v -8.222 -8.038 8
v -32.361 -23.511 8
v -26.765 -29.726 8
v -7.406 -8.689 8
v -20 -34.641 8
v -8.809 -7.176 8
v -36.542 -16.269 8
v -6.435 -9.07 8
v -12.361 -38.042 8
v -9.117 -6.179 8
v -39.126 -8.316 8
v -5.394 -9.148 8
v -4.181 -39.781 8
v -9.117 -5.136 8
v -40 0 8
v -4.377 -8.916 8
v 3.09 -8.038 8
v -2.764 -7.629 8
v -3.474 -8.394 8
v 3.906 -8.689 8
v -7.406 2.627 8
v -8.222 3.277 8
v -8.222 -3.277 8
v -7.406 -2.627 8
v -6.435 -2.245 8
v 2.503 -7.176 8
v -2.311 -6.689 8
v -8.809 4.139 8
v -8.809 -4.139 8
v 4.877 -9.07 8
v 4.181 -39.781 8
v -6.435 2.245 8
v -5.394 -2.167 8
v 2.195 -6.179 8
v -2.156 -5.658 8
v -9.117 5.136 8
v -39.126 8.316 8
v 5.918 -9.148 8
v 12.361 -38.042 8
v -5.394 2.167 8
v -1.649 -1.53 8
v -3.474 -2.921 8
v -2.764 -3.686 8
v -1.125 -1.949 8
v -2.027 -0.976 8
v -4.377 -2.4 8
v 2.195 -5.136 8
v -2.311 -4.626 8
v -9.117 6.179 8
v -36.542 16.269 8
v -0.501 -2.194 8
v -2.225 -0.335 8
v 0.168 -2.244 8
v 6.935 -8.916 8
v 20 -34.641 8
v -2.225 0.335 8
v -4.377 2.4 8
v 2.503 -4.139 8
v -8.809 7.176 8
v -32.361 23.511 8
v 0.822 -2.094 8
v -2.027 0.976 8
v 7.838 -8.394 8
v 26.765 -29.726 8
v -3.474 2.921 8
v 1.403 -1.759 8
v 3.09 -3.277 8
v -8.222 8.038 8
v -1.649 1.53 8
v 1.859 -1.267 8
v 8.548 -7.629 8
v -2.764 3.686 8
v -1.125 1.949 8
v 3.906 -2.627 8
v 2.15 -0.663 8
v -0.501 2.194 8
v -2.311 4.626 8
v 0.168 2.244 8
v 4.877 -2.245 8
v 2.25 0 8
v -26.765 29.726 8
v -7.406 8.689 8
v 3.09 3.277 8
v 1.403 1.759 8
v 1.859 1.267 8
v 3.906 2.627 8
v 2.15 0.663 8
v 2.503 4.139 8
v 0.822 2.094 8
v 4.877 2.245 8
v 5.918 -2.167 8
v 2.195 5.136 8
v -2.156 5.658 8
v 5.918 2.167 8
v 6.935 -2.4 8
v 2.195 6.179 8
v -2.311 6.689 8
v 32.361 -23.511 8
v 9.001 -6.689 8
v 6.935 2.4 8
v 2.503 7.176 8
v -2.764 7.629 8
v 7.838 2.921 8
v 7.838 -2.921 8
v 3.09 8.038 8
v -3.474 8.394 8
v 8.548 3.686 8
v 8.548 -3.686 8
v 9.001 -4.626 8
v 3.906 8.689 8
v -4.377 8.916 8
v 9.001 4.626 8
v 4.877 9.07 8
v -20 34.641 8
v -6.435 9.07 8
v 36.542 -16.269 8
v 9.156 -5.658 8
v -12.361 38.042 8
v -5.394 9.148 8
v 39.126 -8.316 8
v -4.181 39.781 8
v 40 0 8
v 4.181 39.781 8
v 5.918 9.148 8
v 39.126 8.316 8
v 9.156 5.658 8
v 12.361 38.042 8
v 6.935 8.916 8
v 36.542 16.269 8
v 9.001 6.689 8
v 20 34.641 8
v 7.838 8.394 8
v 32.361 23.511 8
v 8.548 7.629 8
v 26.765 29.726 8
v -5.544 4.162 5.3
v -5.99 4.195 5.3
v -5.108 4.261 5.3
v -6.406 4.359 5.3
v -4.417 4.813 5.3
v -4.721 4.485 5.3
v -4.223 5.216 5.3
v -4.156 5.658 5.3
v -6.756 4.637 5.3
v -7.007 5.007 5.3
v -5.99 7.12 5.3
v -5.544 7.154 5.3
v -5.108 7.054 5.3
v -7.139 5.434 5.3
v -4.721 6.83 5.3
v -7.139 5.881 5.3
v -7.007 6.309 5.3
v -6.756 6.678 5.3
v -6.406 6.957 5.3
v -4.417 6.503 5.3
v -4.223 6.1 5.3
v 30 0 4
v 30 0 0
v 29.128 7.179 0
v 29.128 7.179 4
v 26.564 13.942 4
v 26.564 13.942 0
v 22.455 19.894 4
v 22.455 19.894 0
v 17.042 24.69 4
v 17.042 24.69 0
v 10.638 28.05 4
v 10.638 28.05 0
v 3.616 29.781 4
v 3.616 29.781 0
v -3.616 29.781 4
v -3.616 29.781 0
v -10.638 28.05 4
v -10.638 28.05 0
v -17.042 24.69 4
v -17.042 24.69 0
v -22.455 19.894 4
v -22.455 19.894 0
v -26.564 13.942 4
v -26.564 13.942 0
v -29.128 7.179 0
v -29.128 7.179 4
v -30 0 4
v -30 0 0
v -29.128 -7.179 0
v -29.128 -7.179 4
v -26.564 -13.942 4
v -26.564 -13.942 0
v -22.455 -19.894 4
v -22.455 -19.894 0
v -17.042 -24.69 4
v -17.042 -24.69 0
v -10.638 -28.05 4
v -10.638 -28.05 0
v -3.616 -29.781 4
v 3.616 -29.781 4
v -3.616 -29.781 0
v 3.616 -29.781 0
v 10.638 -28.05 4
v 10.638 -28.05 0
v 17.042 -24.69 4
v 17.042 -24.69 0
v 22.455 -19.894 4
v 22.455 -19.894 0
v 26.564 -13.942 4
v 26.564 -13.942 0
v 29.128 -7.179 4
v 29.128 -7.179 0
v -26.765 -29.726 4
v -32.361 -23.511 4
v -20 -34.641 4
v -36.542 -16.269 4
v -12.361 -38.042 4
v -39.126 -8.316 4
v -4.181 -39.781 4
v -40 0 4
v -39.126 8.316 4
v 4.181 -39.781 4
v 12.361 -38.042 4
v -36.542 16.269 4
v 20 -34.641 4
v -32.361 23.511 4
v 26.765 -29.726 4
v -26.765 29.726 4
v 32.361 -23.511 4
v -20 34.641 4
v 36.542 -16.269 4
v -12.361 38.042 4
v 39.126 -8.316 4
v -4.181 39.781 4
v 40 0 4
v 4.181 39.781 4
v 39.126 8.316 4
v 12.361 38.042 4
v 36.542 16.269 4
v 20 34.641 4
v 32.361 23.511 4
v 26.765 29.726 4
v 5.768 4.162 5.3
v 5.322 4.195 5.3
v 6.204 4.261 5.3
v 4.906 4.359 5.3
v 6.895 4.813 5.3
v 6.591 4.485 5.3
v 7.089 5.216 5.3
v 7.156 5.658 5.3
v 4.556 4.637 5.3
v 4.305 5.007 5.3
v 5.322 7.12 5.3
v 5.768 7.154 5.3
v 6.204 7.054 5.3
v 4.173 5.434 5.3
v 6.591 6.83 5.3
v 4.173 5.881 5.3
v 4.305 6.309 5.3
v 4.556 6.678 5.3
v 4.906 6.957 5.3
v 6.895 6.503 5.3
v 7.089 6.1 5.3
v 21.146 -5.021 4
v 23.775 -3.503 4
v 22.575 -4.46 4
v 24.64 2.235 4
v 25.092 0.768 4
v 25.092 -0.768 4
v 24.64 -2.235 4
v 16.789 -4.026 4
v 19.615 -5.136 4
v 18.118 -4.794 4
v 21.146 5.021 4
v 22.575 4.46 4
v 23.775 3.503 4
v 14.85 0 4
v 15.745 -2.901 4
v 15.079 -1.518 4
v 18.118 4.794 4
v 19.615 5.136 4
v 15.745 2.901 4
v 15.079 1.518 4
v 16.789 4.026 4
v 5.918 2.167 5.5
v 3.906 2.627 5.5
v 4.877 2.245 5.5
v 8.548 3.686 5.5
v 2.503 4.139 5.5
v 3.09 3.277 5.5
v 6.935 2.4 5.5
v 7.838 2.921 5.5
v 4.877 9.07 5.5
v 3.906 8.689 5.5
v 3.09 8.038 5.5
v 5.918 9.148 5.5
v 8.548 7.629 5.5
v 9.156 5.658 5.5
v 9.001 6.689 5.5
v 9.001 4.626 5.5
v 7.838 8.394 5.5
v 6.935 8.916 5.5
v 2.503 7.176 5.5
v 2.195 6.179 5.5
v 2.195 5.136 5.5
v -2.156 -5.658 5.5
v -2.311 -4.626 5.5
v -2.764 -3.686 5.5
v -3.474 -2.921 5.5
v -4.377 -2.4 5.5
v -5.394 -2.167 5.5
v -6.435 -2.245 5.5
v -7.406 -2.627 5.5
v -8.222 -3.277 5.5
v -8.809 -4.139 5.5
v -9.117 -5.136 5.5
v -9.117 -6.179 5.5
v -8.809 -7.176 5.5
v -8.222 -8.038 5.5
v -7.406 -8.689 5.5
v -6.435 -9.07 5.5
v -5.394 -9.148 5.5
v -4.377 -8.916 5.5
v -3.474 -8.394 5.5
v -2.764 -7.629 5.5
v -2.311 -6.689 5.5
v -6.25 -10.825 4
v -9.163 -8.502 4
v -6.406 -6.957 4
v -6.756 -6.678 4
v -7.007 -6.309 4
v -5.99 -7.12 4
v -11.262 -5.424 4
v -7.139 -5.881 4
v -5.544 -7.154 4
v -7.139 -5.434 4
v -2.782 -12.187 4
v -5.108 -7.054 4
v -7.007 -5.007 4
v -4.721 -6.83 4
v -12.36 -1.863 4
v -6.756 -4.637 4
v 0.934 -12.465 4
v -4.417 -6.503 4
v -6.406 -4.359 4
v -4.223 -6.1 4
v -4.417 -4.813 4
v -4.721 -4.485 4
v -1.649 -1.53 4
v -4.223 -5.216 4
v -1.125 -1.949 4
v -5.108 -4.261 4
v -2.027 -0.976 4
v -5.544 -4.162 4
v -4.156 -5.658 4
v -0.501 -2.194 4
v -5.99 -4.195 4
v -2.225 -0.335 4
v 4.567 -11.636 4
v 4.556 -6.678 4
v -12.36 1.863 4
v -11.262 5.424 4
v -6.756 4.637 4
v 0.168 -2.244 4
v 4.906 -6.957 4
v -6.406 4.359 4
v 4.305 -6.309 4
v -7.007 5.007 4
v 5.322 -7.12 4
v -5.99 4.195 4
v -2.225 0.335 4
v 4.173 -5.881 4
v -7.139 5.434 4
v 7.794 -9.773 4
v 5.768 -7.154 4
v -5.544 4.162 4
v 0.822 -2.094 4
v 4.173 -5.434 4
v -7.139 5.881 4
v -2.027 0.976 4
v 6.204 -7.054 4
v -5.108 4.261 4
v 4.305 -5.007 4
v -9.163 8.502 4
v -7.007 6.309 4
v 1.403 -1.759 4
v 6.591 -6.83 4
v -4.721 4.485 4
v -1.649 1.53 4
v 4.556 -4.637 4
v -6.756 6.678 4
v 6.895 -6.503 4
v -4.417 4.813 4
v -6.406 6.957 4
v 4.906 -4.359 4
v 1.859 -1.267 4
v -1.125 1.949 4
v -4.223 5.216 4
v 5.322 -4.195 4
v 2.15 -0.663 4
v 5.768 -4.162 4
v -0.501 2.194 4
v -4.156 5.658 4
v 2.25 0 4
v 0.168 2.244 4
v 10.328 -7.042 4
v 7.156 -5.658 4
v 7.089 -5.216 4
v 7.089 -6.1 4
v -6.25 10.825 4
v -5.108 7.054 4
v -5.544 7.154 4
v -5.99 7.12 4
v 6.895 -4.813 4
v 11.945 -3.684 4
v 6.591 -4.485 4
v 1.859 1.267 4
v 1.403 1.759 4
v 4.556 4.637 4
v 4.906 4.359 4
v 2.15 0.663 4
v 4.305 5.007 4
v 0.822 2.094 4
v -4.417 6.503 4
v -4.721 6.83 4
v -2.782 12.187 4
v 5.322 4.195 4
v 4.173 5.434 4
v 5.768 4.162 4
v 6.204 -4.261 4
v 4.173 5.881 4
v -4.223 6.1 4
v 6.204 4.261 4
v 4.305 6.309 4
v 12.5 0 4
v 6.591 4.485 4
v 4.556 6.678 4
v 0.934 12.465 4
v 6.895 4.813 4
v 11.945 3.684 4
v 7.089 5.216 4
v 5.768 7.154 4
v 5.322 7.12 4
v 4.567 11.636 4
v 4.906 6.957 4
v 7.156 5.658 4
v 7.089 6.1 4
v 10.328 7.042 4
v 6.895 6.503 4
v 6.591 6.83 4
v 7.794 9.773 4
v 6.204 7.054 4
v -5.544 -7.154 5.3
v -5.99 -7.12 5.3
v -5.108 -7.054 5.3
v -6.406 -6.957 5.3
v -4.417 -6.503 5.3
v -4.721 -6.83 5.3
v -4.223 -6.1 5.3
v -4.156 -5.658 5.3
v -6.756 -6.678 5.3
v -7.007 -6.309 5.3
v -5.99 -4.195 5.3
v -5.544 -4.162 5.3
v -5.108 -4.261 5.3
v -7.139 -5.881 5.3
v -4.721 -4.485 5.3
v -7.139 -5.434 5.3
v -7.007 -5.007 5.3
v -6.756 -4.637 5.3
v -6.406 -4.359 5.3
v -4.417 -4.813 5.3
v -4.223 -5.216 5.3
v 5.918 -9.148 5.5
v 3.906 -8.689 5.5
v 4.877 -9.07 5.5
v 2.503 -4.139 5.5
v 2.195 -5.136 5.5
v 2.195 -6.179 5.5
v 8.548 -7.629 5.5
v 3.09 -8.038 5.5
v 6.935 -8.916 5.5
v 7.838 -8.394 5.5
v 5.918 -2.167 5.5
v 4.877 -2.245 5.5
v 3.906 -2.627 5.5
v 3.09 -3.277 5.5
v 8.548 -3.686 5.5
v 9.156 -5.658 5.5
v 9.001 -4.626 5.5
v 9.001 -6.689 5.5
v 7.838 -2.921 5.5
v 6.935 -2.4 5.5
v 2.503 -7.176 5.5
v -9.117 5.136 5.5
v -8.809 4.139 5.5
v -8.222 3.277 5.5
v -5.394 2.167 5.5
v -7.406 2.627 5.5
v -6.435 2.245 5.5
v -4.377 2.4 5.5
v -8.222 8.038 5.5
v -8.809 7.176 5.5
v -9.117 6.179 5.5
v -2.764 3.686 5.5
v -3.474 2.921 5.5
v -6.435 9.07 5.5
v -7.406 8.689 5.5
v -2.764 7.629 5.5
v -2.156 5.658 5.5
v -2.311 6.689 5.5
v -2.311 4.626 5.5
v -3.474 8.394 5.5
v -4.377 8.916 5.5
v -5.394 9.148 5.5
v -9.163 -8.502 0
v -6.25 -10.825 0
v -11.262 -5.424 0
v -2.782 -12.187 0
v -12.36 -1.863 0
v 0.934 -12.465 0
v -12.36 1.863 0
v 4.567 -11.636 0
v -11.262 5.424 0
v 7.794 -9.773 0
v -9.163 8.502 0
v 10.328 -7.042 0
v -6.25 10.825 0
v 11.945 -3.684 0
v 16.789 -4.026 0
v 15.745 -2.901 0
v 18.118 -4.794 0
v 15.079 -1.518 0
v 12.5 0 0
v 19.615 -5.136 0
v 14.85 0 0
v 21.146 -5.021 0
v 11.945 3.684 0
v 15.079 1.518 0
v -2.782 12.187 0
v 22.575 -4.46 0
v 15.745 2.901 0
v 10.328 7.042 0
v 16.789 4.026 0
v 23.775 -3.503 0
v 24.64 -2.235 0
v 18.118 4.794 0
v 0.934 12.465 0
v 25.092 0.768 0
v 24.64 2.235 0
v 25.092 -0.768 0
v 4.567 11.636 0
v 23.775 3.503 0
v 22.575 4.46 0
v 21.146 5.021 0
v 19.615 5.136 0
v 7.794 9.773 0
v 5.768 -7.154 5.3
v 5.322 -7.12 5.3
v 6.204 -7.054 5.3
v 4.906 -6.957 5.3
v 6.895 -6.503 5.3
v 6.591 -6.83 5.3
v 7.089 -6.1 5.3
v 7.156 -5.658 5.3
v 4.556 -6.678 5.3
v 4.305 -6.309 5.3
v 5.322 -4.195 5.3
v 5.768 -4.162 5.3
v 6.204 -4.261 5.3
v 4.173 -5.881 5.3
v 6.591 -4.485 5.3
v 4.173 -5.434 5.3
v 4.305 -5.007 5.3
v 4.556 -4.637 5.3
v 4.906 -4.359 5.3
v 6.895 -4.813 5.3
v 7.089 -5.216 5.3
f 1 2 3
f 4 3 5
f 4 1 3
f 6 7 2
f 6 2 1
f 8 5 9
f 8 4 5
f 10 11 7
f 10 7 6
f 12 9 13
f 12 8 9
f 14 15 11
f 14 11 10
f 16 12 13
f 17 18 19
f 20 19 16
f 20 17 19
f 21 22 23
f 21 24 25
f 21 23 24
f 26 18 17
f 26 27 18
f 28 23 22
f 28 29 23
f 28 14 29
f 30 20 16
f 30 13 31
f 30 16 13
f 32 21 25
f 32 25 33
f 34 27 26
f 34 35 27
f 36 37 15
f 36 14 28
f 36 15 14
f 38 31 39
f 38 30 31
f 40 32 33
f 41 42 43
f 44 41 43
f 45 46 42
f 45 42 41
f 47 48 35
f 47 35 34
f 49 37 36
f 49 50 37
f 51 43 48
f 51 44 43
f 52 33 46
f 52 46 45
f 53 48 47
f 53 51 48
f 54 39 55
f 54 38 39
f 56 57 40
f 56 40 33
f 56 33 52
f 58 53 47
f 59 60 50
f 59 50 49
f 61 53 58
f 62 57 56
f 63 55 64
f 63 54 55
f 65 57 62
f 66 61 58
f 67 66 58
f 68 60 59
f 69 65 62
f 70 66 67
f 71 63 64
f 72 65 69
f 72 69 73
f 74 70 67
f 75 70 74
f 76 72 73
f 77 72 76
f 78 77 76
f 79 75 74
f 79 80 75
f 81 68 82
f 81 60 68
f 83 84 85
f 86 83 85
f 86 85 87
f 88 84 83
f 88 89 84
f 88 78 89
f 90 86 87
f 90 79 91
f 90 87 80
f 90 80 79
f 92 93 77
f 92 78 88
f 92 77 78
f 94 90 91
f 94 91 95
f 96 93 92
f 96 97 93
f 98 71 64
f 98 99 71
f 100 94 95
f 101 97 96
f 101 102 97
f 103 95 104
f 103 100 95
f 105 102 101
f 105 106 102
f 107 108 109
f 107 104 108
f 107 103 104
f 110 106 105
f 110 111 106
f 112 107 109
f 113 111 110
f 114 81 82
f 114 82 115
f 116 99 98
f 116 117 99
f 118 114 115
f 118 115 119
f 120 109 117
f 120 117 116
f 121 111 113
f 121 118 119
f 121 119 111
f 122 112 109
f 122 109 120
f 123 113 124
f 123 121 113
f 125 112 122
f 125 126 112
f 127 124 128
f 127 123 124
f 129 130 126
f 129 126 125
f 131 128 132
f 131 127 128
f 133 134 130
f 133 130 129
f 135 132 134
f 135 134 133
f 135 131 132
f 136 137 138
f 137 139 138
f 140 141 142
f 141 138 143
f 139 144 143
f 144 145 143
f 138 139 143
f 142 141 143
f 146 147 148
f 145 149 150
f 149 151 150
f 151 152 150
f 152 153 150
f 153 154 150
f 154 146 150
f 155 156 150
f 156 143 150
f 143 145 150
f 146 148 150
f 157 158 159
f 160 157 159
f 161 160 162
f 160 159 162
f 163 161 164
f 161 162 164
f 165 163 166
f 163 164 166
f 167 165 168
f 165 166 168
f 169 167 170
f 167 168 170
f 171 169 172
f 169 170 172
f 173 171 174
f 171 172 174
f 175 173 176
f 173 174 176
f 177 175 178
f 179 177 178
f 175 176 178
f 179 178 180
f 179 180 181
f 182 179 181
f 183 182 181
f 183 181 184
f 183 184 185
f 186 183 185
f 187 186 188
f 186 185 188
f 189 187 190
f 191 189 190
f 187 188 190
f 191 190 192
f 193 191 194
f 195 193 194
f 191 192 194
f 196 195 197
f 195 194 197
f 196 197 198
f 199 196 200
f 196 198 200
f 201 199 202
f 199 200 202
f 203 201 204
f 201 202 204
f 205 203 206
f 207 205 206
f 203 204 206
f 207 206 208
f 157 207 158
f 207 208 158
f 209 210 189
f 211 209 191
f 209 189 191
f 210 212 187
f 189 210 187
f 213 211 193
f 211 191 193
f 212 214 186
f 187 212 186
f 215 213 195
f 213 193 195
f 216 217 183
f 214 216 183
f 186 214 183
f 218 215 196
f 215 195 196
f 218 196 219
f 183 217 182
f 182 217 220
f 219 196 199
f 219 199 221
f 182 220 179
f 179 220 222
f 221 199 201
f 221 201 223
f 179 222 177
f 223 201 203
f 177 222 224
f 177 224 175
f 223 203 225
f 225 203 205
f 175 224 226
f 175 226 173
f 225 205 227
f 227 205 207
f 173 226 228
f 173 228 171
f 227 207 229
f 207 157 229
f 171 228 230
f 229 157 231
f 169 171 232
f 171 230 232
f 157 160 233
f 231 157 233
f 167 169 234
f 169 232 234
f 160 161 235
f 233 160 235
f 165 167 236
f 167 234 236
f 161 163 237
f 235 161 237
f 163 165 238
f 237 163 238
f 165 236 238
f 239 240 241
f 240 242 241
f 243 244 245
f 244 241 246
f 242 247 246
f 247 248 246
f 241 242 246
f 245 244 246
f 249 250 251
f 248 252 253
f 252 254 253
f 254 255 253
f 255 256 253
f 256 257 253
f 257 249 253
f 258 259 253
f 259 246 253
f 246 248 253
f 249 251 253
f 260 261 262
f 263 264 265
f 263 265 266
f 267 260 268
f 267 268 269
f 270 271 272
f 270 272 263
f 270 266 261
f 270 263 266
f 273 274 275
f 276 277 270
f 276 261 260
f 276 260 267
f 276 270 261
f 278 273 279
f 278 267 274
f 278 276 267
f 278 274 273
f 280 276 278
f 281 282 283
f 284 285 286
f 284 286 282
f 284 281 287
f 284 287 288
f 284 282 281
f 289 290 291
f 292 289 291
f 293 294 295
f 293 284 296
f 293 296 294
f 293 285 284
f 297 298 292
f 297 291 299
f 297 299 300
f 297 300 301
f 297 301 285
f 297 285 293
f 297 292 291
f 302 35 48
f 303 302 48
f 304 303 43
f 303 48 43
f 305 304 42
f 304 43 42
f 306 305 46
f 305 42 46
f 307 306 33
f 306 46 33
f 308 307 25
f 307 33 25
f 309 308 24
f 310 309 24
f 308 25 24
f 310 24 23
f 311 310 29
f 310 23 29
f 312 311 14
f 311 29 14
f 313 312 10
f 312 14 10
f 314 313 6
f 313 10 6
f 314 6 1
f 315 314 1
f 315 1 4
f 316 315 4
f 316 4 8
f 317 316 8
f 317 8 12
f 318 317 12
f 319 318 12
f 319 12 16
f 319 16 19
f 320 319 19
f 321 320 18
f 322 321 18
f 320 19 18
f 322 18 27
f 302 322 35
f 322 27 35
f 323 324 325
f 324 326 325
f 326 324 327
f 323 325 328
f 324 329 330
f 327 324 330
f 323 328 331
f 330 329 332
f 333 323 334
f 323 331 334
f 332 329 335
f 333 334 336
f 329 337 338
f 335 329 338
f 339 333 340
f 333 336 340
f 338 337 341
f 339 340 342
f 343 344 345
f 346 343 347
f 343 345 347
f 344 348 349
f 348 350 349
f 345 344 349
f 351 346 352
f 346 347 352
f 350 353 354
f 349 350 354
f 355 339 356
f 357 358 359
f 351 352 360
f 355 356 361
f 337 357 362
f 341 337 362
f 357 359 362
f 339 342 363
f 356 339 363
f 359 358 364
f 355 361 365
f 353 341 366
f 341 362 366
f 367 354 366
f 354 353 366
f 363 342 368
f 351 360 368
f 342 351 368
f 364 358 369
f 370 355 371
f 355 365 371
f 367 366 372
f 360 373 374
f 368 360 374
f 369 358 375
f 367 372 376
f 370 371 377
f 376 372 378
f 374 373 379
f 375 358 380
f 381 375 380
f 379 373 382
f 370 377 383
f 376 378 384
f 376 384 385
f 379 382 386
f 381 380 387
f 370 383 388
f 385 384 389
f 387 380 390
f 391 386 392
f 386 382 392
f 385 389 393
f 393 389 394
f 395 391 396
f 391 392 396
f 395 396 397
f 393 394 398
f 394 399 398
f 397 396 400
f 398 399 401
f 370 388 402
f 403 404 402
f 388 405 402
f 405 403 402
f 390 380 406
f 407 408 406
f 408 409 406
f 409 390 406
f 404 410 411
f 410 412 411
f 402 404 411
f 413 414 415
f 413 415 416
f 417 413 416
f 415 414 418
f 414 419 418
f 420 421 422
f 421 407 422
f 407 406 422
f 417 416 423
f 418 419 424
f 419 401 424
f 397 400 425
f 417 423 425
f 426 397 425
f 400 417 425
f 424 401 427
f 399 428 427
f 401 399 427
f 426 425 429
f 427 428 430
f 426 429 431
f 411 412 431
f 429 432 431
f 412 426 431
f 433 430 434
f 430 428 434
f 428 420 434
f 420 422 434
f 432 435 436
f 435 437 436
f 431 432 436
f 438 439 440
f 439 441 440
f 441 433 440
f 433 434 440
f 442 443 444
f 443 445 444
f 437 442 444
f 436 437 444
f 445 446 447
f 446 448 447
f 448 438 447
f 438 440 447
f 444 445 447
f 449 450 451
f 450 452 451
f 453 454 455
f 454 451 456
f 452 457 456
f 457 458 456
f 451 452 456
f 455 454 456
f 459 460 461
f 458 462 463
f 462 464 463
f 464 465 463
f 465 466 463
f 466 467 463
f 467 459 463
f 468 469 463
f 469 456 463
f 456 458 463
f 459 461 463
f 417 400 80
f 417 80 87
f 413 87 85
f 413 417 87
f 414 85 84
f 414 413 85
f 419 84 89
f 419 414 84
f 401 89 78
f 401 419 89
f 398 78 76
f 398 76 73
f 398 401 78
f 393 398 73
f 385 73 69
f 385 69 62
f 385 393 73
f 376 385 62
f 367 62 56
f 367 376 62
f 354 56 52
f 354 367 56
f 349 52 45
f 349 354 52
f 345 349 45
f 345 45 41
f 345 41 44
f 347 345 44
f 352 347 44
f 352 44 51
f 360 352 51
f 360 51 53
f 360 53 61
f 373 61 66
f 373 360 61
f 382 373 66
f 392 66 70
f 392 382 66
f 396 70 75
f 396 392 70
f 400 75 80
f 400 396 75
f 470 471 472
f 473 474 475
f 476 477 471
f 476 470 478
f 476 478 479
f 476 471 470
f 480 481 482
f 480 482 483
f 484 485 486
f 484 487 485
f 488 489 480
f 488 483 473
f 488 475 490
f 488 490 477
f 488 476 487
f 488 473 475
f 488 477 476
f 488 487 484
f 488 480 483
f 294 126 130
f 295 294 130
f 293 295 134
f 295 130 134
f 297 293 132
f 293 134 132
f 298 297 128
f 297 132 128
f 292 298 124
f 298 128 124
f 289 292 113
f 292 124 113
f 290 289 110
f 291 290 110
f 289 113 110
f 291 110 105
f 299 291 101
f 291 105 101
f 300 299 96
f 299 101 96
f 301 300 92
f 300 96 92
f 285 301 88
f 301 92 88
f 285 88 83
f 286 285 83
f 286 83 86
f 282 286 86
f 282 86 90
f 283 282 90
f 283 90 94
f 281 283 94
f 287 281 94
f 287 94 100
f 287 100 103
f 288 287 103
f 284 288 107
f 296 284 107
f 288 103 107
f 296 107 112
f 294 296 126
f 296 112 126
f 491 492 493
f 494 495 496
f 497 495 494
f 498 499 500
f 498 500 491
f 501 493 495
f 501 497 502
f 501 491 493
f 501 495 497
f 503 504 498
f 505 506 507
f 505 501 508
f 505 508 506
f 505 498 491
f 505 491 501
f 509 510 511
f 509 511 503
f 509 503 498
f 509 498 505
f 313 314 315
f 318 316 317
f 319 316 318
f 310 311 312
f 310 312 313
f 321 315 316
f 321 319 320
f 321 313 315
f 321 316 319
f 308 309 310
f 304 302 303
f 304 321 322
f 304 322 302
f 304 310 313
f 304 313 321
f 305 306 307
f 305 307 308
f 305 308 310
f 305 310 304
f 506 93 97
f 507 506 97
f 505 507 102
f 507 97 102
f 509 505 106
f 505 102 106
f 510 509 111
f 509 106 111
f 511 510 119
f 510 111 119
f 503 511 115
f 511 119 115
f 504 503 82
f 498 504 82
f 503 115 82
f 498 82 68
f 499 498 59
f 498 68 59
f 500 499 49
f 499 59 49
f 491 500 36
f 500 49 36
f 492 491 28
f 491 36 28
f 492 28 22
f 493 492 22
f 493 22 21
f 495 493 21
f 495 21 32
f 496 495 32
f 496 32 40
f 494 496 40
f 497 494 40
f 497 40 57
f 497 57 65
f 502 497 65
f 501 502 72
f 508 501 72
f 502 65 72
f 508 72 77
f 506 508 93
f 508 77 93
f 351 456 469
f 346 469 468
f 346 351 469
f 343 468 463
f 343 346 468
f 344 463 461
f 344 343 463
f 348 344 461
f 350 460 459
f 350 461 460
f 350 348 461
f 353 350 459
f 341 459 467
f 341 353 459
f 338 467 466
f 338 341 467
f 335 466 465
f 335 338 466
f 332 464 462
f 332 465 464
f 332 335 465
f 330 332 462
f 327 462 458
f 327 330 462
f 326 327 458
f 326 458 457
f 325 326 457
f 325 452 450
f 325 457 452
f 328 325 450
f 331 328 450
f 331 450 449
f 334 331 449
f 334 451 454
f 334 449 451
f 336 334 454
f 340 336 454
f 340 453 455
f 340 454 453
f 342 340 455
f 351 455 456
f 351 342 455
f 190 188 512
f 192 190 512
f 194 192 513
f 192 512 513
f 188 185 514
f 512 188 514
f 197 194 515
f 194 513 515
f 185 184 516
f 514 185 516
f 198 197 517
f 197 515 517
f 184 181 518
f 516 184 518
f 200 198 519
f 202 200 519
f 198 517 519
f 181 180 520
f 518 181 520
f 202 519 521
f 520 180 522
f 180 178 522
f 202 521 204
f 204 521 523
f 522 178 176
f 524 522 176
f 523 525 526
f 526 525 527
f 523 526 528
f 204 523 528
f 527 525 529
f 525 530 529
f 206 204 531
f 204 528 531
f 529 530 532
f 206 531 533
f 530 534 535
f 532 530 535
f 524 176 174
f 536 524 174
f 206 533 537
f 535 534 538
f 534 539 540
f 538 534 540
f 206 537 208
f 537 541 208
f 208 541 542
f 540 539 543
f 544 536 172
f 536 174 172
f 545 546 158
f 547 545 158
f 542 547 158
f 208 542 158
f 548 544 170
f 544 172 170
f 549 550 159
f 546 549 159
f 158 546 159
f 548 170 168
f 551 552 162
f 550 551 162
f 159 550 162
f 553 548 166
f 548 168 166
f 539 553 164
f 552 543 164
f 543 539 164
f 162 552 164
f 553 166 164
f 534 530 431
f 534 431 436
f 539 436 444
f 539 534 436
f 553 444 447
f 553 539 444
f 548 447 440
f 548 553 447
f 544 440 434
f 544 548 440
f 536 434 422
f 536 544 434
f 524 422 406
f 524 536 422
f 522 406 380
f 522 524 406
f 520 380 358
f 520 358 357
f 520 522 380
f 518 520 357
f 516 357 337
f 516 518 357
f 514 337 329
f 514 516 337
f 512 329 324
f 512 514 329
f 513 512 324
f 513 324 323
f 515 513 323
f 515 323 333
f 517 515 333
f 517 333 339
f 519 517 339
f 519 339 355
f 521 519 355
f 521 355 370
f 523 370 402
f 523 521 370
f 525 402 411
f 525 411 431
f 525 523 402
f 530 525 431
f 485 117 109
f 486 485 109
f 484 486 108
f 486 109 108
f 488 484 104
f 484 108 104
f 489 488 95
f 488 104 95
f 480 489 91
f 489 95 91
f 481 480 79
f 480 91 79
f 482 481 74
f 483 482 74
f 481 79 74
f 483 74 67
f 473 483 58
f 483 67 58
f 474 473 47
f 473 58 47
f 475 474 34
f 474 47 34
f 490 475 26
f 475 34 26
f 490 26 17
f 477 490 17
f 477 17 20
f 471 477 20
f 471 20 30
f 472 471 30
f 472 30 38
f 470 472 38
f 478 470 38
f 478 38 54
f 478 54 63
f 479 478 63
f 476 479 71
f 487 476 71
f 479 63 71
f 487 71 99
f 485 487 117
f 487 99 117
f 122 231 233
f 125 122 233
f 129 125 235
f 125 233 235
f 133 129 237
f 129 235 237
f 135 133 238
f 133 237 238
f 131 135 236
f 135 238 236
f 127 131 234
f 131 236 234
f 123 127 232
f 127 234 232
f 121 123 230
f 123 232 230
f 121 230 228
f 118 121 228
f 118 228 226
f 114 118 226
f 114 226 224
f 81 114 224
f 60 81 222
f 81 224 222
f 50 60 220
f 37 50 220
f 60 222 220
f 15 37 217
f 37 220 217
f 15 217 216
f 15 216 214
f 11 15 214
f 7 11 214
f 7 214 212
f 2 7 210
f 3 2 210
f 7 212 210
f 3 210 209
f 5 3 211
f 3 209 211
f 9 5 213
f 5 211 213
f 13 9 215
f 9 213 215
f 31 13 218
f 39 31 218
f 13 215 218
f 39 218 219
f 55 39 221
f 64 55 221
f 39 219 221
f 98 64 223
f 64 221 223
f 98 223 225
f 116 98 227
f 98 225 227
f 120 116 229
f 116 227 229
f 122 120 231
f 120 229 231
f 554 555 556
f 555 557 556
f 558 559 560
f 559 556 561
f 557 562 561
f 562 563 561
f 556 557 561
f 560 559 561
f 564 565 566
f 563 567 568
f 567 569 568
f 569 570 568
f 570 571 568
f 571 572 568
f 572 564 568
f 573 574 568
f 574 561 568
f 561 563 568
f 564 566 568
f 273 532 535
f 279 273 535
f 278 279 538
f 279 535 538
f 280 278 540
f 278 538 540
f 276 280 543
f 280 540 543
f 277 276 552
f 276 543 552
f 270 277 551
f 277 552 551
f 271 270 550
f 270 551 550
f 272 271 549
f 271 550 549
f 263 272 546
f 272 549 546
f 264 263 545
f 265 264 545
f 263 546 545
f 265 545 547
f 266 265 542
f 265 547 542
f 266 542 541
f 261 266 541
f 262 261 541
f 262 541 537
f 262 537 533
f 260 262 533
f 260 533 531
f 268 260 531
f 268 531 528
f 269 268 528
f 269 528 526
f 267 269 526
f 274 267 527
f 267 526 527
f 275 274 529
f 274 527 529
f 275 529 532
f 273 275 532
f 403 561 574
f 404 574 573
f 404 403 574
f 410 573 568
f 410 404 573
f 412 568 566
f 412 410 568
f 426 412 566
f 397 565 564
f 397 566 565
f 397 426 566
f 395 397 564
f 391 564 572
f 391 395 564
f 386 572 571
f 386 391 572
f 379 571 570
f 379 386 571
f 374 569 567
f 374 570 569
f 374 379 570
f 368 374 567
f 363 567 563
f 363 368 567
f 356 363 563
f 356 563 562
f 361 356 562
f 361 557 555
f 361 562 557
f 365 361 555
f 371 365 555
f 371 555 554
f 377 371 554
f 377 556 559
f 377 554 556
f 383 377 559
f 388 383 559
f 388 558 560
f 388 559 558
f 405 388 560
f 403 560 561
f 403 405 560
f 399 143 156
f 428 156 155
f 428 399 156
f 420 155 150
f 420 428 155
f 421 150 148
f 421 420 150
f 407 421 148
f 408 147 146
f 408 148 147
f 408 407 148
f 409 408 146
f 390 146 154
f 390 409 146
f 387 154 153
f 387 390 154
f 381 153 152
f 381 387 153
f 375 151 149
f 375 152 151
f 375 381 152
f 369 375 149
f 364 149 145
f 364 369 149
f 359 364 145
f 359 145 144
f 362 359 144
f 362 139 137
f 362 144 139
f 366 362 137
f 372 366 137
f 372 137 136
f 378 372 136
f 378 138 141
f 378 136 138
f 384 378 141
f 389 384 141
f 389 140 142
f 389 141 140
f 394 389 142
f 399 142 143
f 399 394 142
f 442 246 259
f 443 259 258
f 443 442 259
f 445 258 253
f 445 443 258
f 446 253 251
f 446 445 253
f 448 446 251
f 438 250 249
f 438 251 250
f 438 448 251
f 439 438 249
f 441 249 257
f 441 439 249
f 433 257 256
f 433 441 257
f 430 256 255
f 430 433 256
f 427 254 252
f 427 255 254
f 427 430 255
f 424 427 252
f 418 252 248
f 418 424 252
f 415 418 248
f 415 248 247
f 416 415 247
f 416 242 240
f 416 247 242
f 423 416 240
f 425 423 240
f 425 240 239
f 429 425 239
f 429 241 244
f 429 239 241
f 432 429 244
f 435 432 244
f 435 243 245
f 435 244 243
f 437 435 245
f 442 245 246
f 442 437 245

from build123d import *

# Parameters (mm, degrees)
SKETCH1_R           = 30
SKETCH1_R_2         = 12.5
BOSS_EXTRUDE1_DEPTH = 4
SKETCH2_R           = 40
SKETCH2_R_2         = 2.25
SKETCH2_R_3         = 1.5
BOSS_EXTRUDE2_DEPTH = 4
SKETCH3_R           = 3.5
CUT_EXTRUDE1_DEPTH  = 2.5
SKETCH4_R           = 5.15
CUT_EXTRUDE2_DEPTH  = 4
SKETCH5_R           = 3.5
BOSS_EXTRUDE3_DEPTH = 0.2


with BuildPart() as part:
    # Sketch1 → Boss-Extrude1 (new body)
    with BuildSketch(Plane.XY):
        Circle(SKETCH1_R)
        Circle(SKETCH1_R_2, mode=Mode.SUBTRACT)
    extrude(amount=BOSS_EXTRUDE1_DEPTH)

    # Sketch2 → Boss-Extrude2 (add)
    with BuildSketch(Plane.XY.offset(4)):
        Circle(SKETCH2_R)
        Circle(SKETCH2_R_2, mode=Mode.SUBTRACT)
        with Locations((-5.655999742, 5.657708628)):
            Circle(SKETCH2_R_3, mode=Mode.SUBTRACT)
        with Locations((-5.655999742, -5.657708628)):
            Circle(SKETCH2_R_3, mode=Mode.SUBTRACT)
        with Locations((5.655999742, -5.657708628)):
            Circle(SKETCH2_R_3, mode=Mode.SUBTRACT)
        with Locations((5.655999742, 5.657708628)):
            Circle(SKETCH2_R_3, mode=Mode.SUBTRACT)
    extrude(amount=BOSS_EXTRUDE2_DEPTH)

    # Sketch3 → Cut-Extrude1 (cut)
    with BuildSketch(Plane.XY.offset(8)):
        with Locations((-5.655999742, 5.657708628)):
            Circle(SKETCH3_R)
        with Locations((5.655999742, 5.657708628)):
            Circle(SKETCH3_R)
        with Locations((5.655999742, -5.657708628)):
            Circle(SKETCH3_R)
        with Locations((-5.655999742, -5.657708628)):
            Circle(SKETCH3_R)
    extrude(amount=-CUT_EXTRUDE1_DEPTH, mode=Mode.SUBTRACT)

    # Sketch4 → Cut-Extrude2 (cut)
    with BuildSketch(Plane(origin=(0, 0, 0), x_dir=(-1, 0, 0), z_dir=(0, 0, -1))):
        with Locations((-20, 0)):
            Circle(SKETCH4_R)
    extrude(amount=-CUT_EXTRUDE2_DEPTH, mode=Mode.SUBTRACT)

    # Sketch5 → Boss-Extrude3 (add)
    with BuildSketch(Plane.XY.offset(5.5)):
        with Locations((-5.655999742, 5.657708628)):
            Circle(SKETCH5_R)
        with Locations((5.655999742, 5.657708628)):
            Circle(SKETCH5_R)
        with Locations((-5.655999742, -5.657708628)):
            Circle(SKETCH5_R)
        with Locations((5.655999742, -5.657708628)):
            Circle(SKETCH5_R)
    extrude(amount=-BOSS_EXTRUDE3_DEPTH)


solid = part.part
